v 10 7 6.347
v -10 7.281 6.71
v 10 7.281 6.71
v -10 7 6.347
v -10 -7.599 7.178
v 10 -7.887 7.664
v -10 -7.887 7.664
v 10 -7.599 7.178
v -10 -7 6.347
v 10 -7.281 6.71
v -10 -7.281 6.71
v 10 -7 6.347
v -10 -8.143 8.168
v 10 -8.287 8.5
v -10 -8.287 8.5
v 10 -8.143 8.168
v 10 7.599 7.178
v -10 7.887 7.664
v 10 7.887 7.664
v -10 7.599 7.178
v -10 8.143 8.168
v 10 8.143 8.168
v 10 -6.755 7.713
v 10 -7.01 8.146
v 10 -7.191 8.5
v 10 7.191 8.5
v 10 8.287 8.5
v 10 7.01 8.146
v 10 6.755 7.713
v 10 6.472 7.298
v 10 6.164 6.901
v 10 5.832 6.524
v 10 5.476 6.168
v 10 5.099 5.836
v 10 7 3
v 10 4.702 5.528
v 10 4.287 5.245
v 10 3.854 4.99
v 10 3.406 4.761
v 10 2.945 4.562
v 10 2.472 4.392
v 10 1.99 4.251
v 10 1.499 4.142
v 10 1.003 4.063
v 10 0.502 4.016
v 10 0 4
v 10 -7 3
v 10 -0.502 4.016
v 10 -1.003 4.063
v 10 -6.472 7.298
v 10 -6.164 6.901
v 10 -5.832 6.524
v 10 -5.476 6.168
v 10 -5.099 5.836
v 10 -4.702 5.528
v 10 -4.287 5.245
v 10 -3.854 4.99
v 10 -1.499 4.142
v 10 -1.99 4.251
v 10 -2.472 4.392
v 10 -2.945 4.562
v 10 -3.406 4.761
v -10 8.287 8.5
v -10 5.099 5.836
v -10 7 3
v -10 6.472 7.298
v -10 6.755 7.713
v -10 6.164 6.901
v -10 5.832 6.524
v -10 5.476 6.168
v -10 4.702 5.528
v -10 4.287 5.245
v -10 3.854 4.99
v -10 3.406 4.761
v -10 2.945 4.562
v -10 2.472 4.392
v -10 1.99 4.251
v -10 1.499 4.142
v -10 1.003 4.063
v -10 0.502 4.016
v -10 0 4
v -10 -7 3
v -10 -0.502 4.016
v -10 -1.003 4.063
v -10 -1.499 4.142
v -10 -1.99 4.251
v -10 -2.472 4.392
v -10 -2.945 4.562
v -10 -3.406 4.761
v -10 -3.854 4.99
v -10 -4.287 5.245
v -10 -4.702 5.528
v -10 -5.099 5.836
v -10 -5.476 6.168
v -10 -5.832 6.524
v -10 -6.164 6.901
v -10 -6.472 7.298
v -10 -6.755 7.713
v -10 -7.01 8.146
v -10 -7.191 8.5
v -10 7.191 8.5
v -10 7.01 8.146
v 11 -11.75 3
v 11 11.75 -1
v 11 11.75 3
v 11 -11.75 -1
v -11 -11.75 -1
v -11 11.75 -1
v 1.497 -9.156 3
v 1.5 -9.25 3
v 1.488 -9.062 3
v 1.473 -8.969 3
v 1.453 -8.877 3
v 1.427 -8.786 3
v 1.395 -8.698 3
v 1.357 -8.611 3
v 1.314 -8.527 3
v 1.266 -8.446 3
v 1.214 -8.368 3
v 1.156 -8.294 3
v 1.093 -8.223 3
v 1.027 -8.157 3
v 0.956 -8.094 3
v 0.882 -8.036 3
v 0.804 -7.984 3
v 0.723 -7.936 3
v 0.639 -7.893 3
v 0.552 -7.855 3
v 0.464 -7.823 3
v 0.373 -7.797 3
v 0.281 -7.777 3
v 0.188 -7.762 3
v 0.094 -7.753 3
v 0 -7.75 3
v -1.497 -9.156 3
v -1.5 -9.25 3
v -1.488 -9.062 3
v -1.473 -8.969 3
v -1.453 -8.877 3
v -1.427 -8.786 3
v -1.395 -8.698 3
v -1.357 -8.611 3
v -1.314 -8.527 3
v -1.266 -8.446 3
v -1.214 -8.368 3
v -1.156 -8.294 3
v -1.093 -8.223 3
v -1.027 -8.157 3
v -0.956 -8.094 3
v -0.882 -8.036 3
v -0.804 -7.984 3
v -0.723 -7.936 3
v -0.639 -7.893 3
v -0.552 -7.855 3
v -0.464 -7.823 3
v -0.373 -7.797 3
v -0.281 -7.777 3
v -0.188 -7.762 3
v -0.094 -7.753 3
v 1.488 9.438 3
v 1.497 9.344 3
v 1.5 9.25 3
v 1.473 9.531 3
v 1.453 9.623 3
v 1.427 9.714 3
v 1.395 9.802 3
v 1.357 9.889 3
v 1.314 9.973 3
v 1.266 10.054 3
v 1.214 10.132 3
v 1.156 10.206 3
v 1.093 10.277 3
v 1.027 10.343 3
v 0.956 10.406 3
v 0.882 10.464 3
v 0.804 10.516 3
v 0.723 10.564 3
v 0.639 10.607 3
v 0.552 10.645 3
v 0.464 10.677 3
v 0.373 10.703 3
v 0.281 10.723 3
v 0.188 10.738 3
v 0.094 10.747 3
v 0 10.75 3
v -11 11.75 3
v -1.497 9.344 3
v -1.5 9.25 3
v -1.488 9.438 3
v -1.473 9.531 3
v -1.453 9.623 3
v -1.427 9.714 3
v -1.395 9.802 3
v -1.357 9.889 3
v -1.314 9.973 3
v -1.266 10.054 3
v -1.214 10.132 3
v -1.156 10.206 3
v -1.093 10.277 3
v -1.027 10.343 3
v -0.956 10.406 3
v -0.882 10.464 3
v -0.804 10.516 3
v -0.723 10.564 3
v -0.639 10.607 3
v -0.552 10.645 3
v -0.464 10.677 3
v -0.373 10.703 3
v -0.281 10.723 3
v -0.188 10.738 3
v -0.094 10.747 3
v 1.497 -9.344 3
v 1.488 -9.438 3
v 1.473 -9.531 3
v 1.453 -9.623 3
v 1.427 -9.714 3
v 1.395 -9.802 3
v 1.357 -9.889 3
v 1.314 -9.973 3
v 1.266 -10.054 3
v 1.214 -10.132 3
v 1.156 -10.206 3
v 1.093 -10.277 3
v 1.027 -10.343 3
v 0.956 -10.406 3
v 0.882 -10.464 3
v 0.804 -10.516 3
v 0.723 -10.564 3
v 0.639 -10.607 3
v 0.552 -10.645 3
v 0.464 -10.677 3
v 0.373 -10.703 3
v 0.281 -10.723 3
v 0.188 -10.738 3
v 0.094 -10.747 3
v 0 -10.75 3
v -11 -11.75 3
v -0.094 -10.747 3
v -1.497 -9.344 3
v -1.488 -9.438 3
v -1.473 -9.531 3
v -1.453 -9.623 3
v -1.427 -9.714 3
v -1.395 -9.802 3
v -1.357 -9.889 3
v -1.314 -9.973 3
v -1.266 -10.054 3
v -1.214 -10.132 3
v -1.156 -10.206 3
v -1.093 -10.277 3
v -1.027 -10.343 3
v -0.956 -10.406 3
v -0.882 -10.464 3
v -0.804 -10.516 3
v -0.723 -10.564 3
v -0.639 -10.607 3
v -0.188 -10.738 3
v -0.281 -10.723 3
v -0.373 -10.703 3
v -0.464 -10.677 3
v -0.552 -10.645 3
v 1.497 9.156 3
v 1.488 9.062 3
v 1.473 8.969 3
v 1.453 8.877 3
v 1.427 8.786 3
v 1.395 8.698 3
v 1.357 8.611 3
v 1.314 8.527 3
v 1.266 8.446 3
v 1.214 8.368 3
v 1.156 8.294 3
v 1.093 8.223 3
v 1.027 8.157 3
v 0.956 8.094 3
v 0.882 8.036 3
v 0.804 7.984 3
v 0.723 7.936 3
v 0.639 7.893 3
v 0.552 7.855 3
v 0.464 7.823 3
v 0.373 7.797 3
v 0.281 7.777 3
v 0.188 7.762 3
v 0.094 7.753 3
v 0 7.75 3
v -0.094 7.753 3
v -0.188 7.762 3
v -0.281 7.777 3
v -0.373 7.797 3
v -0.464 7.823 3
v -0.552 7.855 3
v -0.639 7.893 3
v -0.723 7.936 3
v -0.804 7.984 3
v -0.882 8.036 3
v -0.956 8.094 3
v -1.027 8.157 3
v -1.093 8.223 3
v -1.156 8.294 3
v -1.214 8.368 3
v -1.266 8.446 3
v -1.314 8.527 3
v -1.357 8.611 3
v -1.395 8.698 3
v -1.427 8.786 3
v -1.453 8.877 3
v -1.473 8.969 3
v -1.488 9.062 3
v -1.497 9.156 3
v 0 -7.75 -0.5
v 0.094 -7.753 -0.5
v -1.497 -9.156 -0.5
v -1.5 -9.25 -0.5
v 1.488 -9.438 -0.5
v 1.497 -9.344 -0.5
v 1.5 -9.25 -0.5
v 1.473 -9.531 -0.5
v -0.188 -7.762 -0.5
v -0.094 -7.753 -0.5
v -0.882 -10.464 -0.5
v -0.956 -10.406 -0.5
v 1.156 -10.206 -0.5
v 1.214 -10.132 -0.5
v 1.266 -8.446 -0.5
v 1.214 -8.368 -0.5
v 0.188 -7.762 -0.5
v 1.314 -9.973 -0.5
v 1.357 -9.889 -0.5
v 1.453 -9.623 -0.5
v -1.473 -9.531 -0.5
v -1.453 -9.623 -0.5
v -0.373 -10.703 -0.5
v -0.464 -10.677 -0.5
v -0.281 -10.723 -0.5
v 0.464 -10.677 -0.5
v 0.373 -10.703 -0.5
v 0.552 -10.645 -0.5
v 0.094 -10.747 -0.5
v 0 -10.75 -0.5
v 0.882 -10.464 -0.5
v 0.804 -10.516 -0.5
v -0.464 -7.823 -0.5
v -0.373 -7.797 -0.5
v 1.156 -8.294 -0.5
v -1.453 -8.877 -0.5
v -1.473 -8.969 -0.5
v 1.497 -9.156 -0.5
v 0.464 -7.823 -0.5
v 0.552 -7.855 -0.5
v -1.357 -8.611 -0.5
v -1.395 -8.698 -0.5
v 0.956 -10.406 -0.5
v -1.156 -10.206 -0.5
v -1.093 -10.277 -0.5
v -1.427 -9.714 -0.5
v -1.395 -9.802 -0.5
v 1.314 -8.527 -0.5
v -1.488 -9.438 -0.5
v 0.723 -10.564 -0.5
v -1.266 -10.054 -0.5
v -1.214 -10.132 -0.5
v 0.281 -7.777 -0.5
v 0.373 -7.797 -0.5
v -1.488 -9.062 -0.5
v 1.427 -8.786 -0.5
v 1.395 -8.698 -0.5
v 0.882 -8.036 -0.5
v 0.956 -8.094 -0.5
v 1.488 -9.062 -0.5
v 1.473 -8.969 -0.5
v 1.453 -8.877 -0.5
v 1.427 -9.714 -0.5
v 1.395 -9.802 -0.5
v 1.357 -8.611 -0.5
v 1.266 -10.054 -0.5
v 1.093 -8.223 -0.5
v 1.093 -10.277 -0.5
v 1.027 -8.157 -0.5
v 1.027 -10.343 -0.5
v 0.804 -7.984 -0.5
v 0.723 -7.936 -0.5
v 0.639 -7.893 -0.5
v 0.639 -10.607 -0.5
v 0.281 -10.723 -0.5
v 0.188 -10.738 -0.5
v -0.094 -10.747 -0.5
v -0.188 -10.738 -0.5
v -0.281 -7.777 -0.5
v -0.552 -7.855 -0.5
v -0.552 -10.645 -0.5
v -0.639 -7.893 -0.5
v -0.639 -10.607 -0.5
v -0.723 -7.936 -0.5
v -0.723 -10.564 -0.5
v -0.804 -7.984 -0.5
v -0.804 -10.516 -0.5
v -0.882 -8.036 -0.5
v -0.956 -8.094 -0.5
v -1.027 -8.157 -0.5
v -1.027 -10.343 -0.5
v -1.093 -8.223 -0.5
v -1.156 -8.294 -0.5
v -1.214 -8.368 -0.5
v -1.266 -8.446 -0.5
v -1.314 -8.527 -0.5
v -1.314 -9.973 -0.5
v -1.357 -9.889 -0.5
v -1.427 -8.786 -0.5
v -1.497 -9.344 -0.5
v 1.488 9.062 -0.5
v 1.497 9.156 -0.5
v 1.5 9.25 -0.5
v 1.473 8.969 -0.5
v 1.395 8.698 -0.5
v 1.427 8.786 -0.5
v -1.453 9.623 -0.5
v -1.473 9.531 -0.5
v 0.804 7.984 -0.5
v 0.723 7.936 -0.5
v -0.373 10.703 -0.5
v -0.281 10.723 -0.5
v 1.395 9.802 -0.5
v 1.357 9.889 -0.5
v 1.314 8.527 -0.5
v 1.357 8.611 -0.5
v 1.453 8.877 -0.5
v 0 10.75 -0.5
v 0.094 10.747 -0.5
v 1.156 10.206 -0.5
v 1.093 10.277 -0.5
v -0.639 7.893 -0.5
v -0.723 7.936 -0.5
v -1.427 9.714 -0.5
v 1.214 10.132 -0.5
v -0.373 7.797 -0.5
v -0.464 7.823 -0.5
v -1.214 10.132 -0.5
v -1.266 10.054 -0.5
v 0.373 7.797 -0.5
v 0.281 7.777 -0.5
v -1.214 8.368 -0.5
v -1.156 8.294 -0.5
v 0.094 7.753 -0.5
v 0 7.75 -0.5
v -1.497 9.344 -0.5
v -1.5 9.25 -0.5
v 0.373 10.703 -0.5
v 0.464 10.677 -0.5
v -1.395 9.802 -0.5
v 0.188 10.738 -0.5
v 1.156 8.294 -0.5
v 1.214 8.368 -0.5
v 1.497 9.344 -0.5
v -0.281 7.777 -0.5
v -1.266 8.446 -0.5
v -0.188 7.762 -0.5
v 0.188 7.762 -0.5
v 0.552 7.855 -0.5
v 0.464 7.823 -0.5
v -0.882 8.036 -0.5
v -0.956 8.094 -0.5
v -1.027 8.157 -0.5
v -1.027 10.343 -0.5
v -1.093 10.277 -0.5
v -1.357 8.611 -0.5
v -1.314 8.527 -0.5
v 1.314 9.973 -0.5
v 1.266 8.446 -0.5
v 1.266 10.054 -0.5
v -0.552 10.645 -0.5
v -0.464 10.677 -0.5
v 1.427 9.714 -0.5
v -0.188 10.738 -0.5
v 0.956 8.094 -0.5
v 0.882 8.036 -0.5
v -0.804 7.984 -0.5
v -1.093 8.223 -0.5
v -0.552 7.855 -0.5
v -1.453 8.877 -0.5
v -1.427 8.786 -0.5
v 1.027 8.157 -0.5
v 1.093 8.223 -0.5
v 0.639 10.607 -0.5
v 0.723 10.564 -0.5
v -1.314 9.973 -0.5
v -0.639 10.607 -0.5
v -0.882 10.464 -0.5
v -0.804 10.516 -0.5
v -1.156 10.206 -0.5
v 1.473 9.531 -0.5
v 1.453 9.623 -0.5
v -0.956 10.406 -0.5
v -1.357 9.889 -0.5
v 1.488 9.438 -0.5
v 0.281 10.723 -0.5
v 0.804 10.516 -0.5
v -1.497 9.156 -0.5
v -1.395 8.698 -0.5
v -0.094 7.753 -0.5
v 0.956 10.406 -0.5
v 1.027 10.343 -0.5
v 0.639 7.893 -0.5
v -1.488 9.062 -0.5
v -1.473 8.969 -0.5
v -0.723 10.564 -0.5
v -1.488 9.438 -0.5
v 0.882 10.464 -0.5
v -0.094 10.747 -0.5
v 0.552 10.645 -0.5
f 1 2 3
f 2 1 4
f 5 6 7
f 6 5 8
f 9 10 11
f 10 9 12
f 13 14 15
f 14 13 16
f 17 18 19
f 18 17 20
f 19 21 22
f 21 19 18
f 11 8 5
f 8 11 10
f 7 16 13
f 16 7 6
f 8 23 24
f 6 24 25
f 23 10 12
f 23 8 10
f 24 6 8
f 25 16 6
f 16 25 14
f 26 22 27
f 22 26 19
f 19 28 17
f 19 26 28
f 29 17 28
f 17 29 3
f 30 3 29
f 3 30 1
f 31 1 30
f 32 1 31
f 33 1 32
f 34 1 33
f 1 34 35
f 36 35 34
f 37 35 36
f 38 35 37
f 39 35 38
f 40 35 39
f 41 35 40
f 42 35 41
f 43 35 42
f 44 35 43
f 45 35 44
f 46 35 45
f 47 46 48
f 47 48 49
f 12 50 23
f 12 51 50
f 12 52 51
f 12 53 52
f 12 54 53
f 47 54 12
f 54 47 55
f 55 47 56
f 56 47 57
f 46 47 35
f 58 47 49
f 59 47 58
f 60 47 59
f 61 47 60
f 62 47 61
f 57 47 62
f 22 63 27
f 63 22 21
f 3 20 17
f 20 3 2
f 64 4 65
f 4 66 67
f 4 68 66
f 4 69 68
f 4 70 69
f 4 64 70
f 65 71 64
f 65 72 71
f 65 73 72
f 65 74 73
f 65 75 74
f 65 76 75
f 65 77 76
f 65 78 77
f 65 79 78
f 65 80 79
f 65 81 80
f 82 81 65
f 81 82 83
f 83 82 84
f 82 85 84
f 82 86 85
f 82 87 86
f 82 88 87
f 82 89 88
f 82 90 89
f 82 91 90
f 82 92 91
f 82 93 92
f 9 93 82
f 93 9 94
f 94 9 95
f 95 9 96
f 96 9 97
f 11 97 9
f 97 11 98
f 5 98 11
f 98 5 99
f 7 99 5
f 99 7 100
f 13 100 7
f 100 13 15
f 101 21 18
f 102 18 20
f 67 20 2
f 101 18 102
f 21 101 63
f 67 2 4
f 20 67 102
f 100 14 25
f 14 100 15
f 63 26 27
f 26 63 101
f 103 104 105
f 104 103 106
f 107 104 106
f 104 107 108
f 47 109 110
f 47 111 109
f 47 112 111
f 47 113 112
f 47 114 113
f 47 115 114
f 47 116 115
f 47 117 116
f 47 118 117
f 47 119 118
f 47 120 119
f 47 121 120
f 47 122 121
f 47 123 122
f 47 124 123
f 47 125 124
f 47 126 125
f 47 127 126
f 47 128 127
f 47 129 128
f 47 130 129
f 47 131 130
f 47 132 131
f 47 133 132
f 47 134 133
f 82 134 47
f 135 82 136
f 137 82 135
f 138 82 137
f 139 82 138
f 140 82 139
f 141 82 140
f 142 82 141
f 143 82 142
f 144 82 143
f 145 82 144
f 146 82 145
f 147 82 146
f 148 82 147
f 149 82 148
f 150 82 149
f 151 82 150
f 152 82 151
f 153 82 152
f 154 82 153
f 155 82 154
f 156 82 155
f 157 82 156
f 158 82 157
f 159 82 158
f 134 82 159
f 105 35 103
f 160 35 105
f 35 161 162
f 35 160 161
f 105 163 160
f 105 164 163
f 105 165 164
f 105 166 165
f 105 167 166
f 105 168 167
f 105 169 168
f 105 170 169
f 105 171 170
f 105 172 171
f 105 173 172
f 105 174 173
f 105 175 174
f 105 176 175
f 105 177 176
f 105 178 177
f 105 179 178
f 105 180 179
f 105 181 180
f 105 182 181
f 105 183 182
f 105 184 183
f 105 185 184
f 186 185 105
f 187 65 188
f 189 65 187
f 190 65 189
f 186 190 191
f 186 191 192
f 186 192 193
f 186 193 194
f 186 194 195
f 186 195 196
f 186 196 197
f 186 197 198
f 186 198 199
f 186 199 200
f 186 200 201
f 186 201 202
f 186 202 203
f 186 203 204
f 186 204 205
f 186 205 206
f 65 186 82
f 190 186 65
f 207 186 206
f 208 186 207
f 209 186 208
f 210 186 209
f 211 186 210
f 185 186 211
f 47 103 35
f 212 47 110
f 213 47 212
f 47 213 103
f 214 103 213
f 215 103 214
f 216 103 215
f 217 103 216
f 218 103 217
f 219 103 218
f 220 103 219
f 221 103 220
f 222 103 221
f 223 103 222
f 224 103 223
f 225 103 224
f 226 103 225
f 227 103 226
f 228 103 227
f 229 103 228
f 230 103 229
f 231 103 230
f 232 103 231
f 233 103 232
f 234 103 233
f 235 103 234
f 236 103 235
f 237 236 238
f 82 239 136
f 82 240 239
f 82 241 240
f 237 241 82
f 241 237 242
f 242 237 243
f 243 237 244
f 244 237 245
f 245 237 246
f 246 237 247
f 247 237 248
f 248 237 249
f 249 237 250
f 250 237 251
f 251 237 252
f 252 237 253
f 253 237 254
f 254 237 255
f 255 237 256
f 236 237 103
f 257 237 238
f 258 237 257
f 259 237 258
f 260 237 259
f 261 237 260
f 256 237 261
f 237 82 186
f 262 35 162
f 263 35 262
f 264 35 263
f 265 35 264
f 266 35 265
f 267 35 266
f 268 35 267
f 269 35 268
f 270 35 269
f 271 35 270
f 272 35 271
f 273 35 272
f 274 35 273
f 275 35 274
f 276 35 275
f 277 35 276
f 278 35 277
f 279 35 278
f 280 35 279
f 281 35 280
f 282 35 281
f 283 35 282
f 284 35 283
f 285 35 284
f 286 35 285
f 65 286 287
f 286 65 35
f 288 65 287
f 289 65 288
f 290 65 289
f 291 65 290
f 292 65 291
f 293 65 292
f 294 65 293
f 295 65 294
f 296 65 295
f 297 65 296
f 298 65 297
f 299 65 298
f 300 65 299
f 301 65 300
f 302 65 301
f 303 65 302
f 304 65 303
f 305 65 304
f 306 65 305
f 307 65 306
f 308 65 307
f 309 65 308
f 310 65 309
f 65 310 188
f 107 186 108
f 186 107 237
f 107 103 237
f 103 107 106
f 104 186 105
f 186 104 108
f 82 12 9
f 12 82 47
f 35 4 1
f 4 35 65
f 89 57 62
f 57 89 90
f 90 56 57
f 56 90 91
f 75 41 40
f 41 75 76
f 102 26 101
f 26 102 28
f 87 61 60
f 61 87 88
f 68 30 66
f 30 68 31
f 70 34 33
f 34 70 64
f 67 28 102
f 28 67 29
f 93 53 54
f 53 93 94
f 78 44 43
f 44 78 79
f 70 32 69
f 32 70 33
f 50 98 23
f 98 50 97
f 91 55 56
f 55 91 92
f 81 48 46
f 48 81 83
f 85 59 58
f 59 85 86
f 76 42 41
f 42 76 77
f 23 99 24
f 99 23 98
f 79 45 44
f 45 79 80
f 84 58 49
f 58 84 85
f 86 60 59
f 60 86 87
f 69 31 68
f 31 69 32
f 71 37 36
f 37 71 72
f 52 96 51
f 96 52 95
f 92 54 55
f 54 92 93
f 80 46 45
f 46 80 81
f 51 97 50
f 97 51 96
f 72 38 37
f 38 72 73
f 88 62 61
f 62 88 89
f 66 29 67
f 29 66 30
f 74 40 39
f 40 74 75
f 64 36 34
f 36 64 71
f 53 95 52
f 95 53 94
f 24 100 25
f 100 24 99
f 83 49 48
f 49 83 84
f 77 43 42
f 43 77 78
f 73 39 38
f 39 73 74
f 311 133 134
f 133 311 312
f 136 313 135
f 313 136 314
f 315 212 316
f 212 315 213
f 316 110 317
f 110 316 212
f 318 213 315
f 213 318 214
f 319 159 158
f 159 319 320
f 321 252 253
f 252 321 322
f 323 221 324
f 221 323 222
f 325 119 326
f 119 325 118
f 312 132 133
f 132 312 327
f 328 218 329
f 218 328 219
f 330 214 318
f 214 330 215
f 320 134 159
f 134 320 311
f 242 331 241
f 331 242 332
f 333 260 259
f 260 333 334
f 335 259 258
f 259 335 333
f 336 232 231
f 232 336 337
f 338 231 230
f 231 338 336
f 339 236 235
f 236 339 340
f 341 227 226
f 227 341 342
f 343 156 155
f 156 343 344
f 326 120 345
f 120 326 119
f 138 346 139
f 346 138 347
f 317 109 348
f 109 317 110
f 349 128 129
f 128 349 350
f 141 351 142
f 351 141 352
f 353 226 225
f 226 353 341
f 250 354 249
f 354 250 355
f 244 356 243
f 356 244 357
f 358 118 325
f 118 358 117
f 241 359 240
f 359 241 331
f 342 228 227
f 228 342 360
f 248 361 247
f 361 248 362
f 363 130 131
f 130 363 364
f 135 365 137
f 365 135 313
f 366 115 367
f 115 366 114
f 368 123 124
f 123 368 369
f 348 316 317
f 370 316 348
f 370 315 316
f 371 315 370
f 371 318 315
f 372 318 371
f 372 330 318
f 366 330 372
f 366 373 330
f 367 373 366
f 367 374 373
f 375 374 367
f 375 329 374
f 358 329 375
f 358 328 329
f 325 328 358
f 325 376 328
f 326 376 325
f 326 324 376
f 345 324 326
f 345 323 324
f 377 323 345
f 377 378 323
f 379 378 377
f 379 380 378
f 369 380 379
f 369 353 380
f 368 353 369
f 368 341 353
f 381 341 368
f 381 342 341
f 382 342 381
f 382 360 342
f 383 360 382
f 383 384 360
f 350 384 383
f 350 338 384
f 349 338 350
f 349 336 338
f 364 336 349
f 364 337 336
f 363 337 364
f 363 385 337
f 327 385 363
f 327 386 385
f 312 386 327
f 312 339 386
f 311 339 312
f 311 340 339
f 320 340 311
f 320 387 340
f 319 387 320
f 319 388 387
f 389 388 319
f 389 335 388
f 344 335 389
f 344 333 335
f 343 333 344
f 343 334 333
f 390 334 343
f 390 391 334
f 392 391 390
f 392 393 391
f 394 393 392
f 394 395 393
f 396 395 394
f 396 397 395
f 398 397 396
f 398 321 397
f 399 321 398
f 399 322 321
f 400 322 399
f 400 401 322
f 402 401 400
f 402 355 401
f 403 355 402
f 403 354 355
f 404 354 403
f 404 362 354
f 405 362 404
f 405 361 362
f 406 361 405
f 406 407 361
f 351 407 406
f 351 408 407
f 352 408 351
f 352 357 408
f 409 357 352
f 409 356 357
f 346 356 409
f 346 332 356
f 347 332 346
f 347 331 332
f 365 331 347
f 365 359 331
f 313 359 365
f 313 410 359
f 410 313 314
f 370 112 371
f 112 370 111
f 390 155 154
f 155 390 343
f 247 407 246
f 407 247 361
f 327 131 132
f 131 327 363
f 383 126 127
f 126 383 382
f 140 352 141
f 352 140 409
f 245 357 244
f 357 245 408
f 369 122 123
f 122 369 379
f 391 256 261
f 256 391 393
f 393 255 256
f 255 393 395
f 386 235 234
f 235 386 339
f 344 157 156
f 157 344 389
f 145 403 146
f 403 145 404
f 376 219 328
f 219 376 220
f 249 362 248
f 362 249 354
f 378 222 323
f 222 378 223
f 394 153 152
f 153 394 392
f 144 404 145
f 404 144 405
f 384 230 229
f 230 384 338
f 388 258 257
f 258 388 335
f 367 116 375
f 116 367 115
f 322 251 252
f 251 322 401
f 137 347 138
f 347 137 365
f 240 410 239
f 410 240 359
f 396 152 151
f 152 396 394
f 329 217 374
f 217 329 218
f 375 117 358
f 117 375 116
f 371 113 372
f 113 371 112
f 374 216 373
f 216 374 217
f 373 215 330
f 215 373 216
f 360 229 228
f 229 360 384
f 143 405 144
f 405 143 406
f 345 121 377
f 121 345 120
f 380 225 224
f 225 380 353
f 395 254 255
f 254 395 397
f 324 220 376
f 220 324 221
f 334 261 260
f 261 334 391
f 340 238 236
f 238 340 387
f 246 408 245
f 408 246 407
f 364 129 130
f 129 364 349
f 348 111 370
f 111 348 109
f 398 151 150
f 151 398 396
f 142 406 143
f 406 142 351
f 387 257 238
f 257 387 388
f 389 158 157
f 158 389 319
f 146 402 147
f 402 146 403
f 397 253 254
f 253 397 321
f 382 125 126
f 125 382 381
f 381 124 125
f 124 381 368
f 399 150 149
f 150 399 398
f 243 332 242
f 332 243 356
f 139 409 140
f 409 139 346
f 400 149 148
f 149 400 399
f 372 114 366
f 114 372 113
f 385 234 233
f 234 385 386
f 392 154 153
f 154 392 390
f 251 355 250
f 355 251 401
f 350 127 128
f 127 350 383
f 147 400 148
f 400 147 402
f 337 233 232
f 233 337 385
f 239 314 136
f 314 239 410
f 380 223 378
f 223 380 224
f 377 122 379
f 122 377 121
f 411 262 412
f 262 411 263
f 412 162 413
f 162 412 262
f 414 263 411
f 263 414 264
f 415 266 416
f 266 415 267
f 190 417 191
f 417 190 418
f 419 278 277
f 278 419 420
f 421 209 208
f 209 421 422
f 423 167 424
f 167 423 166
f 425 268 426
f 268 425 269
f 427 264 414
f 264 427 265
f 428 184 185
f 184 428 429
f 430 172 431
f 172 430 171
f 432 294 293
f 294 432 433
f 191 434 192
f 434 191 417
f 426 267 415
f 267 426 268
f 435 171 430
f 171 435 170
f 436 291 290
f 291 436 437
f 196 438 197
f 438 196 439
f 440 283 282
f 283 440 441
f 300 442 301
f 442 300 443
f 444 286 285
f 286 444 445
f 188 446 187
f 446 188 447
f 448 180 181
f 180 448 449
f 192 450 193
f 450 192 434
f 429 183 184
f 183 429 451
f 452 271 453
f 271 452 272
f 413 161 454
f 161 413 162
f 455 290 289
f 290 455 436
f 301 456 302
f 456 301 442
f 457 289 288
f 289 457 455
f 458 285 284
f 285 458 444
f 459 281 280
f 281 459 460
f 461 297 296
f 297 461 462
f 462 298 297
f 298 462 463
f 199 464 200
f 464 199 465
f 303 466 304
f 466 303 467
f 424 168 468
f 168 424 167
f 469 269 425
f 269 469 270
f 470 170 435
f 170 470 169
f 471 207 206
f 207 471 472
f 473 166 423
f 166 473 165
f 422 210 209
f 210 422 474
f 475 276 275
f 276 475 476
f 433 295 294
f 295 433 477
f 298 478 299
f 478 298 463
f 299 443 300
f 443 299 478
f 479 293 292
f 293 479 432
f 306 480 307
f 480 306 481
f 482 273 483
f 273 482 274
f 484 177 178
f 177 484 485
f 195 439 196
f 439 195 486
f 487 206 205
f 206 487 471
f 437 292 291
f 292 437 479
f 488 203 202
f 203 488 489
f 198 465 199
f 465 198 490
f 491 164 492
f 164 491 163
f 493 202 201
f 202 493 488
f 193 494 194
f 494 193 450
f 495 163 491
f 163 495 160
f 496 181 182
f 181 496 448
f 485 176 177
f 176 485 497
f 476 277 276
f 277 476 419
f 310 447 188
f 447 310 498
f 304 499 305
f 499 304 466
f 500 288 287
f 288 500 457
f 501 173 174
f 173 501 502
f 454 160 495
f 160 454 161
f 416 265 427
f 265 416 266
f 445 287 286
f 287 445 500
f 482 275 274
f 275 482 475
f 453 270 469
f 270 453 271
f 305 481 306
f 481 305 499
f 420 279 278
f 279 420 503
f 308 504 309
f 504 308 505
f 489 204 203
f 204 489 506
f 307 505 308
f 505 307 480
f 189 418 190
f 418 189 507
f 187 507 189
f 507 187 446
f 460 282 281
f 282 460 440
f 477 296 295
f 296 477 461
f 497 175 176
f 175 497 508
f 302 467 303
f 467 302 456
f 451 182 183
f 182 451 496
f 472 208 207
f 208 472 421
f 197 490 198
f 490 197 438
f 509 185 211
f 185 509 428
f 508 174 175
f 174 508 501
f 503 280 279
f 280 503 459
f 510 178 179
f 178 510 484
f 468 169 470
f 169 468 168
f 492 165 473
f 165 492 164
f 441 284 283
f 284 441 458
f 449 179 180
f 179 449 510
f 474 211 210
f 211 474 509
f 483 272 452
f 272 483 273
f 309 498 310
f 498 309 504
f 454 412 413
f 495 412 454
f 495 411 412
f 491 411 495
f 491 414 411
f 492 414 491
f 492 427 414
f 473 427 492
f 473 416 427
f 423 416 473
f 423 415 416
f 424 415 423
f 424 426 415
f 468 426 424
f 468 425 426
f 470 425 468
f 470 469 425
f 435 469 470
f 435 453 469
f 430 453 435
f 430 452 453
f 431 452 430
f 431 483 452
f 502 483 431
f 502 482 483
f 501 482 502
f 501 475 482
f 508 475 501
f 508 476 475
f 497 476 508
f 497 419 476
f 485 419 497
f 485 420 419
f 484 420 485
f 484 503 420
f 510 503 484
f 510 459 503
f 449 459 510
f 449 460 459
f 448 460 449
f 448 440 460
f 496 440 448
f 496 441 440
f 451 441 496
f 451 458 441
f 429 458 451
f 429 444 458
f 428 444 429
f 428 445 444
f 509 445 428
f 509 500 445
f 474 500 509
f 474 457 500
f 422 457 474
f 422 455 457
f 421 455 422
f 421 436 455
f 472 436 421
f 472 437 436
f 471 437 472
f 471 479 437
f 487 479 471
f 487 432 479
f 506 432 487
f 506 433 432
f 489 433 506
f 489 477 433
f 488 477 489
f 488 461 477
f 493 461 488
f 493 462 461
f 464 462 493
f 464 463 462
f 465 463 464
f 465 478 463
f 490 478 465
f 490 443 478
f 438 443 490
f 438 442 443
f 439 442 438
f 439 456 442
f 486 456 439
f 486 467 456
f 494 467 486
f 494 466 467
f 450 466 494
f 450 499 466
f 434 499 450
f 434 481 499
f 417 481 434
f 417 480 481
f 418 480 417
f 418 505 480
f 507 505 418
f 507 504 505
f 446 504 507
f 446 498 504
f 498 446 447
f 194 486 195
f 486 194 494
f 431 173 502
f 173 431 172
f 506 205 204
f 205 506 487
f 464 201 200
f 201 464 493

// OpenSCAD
BaseHeight = 4;
BaseWidth = 23.5;
HoleRadius = 1.5;
LMRadius = 8;

/* [HIDDEN] */
$fn = 100;

translate([0,0,12])
    rotate([180,0,0])
        comFuro();

module base(){
    translate([0,0,9+BaseHeight/2]) 
        cube([22,BaseWidth,BaseHeight],center=true);
    translate([0,0,8]) 
        cube([20,14,6],center=true);
    rotate([0,90,0]){
        difference(){
            cylinder(h=20,r=LMRadius+1,center=true);            
            translate([8,0,0])cube([23,23,32],center=true);
        }
    }
}
module comFuro(){
    difference()
    {
        y = (BaseWidth/2)-1-HoleRadius;
        base();
        rotate([0,90,0])
            cylinder(h=24,r=LMRadius,center=true);        
        translate([0,y,10]) 
            cylinder(r=HoleRadius,h=5,center=true);
        translate([0,-y,10]) 
            cylinder(r=HoleRadius,h=5,center=true);
    }
}
